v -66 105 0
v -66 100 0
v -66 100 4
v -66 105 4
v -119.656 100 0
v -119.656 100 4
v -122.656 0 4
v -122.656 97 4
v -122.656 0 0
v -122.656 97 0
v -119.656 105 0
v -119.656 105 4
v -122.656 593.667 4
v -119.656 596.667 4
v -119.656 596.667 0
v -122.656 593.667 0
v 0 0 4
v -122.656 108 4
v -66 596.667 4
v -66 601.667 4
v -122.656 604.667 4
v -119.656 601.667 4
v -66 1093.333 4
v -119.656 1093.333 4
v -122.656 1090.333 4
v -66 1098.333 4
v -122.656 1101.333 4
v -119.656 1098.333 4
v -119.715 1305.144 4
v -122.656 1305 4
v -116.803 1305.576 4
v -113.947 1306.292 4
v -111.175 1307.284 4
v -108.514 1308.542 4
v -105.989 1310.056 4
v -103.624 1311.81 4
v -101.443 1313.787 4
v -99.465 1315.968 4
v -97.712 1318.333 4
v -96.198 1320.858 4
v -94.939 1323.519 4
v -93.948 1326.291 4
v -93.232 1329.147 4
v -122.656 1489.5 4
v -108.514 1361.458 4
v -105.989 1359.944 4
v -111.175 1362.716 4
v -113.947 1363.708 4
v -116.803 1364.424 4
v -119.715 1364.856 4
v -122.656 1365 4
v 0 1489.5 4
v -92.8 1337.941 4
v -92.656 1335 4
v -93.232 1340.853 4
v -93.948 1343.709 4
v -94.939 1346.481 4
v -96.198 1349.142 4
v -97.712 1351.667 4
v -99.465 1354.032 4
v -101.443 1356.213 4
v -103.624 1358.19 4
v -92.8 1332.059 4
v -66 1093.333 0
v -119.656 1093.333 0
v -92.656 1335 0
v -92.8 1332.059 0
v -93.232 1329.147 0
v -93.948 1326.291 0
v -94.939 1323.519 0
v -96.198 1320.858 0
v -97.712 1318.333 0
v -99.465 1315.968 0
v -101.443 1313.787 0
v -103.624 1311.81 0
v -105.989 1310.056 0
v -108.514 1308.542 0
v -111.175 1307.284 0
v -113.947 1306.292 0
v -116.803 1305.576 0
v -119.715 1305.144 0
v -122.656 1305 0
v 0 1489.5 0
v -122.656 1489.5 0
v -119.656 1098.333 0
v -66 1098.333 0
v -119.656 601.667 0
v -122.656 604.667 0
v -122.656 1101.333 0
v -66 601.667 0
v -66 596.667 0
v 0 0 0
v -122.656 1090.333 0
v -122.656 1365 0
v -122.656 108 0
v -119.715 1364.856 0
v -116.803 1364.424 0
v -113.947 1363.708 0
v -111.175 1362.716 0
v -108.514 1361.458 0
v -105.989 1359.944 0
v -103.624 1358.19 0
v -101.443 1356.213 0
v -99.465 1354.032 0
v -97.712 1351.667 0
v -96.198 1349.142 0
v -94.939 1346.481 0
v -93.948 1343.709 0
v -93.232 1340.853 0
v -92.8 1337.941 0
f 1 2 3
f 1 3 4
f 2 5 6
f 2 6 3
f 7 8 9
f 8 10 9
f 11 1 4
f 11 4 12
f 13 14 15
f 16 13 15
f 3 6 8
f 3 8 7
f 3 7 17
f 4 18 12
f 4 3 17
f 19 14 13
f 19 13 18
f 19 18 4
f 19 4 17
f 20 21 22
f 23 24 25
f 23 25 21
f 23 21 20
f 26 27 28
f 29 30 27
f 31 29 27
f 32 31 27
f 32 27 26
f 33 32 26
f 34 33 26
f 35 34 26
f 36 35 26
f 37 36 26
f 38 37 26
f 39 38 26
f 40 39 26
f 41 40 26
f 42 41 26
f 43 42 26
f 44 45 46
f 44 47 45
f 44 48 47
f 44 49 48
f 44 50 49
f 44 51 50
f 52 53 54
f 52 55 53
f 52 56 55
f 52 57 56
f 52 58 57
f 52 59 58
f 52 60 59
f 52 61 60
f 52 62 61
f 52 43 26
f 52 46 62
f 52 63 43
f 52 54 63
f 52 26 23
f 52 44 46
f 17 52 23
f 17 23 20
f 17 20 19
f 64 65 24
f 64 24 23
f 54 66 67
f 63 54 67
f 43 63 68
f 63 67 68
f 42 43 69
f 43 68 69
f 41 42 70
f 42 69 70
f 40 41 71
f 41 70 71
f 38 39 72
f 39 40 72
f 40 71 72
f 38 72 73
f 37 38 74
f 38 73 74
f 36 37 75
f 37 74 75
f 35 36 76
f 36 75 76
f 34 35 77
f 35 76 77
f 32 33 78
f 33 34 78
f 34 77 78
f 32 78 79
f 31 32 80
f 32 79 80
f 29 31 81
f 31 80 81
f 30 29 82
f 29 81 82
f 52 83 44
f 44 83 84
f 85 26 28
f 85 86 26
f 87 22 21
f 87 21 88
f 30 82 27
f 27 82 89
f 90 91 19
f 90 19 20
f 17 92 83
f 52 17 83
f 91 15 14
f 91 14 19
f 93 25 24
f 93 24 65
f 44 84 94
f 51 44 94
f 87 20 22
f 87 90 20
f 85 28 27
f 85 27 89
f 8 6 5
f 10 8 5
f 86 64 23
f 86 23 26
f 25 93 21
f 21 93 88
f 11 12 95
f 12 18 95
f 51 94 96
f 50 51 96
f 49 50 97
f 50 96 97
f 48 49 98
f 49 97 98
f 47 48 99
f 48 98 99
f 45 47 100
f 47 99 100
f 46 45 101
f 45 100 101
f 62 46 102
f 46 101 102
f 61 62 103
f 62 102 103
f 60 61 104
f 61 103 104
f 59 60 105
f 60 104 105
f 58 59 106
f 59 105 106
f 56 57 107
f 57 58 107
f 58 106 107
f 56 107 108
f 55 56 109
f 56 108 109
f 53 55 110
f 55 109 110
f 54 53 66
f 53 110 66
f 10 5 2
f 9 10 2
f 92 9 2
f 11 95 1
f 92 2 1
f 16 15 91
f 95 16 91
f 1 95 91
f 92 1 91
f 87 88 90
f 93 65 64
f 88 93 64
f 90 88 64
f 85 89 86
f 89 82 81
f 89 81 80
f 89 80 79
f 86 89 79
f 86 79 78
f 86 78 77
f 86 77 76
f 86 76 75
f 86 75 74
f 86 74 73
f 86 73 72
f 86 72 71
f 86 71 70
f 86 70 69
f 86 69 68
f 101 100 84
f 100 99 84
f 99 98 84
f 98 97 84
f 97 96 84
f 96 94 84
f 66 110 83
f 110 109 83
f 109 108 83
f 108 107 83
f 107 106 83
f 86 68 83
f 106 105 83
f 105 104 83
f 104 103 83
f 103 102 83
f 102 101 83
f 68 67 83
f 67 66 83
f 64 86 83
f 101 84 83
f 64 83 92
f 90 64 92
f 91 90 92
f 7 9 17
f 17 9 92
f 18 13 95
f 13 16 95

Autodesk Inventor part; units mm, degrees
ref_plane "YZ Plane" through (0, 0, 0) normal (1, 0, 0) x (0, 1, 0)
ref_plane "XZ Plane" through (0, 0, 0) normal (0, 1, 0) x (-1, 0, 0)
ref_plane "XY Plane" through (0, 0, 0) normal (0, 0, 1) x (1, 0, 0)
sketch "Sketch1" plane through (0, 0, 0) normal (0, 0, 1) x (1, 0, 0)
  line L0 (0, 1489.5) -> (-122.6558, 1489.5)
  line L1 (-122.6558, 1489.5) -> (-122.6558, 0)
  line L2 (-122.6558, 0) -> (0, 0)
  line L3 (0, 0) -> (0, 1489.5)
  line L4 (-122.6558, 100) -> (-66, 100)
  line L5 (-66, 100) -> (-66, 105)
  line L6 (-66, 105) -> (-122.6558, 105)
  line L7 (-122.6558, 105) -> (-122.6558, 100)
  line L8 (-122.6558, 596.6667) -> (-66, 596.6667)
  line L9 (-66, 596.6667) -> (-66, 601.6667)
  line L10 (-66, 601.6667) -> (-122.6558, 601.6667)
  line L11 (-122.6558, 601.6667) -> (-122.6558, 596.6667)
  line L12 (-122.6558, 1093.3333) -> (-66, 1093.3333)
  line L13 (-66, 1093.3333) -> (-66, 1098.3333)
  line L14 (-66, 1098.3333) -> (-122.6558, 1098.3333)
  line L15 (-122.6558, 1098.3333) -> (-122.6558, 1093.3333)
  circle A0 centre (-122.6558, 1335) radius 30
  point P0 (-122.6558, 601.6667)
  point P1 (-122.6558, 1365)
  point P2 (-122.6558, 1305)
  dimension "d0" = 1489.5
  dimension "d1" = 122.6559
  dimension "d2" = 5
  dimension "d4" = 100
  dimension "d7" = 496.6667
  dimension "d23" = 66
  dimension "d29" = 60
  dimension "d30" = 1335
extrude "Plate1" add sketch "Sketch1" along normal blind 4 contours L3 L2 L1 L4 L5 L6 L8 L9 L10 L12 L13 L14 A0 L0
chamfer "Corner Chamfer1" distance 3 angle 45 6 edges at (-122.6558, 100, 2) (-122.6558, 105, 2) (-122.6558, 596.6667, 2) (-122.6558, 601.6667, 2) (-122.6558, 1098.3333, 2) (-122.6558, 1093.3333, 2)
equation "\"d0\" = Стрингер_длина"
equation "\"d1\" = стрингер_глубина_7"
equation "\"d2\" = паз_под_стрингер_толщина"
equation "\"d7\" = Шаг_шпангоутов"
equation "\"d23\" = паз_под_стрингер_глубина - Thickness"
equation "\"d29\" = 2 * радиус_выреза_под_сварку"
equation "\"d12\" = Thickness"
equation "\"BendRadius\" = Thickness"
equation "\"BendReliefWidth\" = Thickness"
equation "\"BendReliefDepth\" = 0.5 * Thickness"
equation "\"CornerReliefSize\" = 4 * Thickness"
equation "\"MinimumRemnant\" = 2 * Thickness"
equation "\"TransitionRadius\" = BendRadius"
equation "\"JacobiRadiusSize\" = BendRadius"
equation "\"GapSize\" = Thickness"
equation "\"Стрингер_длина\" = 1489.5"
equation "\"стрингер_глубина_7\" = 122.65585"
equation "\"паз_под_стрингер_толщина\" = 5"
equation "\"Шаг_шпангоутов\" = 496.666667"
equation "\"паз_под_стрингер_глубина\" = 70"
equation "\"Thickness\" = 4"
equation "\"радиус_выреза_под_сварку\" = 30"
properties part number "GBK 3312 stringer 7" material "Steel"
